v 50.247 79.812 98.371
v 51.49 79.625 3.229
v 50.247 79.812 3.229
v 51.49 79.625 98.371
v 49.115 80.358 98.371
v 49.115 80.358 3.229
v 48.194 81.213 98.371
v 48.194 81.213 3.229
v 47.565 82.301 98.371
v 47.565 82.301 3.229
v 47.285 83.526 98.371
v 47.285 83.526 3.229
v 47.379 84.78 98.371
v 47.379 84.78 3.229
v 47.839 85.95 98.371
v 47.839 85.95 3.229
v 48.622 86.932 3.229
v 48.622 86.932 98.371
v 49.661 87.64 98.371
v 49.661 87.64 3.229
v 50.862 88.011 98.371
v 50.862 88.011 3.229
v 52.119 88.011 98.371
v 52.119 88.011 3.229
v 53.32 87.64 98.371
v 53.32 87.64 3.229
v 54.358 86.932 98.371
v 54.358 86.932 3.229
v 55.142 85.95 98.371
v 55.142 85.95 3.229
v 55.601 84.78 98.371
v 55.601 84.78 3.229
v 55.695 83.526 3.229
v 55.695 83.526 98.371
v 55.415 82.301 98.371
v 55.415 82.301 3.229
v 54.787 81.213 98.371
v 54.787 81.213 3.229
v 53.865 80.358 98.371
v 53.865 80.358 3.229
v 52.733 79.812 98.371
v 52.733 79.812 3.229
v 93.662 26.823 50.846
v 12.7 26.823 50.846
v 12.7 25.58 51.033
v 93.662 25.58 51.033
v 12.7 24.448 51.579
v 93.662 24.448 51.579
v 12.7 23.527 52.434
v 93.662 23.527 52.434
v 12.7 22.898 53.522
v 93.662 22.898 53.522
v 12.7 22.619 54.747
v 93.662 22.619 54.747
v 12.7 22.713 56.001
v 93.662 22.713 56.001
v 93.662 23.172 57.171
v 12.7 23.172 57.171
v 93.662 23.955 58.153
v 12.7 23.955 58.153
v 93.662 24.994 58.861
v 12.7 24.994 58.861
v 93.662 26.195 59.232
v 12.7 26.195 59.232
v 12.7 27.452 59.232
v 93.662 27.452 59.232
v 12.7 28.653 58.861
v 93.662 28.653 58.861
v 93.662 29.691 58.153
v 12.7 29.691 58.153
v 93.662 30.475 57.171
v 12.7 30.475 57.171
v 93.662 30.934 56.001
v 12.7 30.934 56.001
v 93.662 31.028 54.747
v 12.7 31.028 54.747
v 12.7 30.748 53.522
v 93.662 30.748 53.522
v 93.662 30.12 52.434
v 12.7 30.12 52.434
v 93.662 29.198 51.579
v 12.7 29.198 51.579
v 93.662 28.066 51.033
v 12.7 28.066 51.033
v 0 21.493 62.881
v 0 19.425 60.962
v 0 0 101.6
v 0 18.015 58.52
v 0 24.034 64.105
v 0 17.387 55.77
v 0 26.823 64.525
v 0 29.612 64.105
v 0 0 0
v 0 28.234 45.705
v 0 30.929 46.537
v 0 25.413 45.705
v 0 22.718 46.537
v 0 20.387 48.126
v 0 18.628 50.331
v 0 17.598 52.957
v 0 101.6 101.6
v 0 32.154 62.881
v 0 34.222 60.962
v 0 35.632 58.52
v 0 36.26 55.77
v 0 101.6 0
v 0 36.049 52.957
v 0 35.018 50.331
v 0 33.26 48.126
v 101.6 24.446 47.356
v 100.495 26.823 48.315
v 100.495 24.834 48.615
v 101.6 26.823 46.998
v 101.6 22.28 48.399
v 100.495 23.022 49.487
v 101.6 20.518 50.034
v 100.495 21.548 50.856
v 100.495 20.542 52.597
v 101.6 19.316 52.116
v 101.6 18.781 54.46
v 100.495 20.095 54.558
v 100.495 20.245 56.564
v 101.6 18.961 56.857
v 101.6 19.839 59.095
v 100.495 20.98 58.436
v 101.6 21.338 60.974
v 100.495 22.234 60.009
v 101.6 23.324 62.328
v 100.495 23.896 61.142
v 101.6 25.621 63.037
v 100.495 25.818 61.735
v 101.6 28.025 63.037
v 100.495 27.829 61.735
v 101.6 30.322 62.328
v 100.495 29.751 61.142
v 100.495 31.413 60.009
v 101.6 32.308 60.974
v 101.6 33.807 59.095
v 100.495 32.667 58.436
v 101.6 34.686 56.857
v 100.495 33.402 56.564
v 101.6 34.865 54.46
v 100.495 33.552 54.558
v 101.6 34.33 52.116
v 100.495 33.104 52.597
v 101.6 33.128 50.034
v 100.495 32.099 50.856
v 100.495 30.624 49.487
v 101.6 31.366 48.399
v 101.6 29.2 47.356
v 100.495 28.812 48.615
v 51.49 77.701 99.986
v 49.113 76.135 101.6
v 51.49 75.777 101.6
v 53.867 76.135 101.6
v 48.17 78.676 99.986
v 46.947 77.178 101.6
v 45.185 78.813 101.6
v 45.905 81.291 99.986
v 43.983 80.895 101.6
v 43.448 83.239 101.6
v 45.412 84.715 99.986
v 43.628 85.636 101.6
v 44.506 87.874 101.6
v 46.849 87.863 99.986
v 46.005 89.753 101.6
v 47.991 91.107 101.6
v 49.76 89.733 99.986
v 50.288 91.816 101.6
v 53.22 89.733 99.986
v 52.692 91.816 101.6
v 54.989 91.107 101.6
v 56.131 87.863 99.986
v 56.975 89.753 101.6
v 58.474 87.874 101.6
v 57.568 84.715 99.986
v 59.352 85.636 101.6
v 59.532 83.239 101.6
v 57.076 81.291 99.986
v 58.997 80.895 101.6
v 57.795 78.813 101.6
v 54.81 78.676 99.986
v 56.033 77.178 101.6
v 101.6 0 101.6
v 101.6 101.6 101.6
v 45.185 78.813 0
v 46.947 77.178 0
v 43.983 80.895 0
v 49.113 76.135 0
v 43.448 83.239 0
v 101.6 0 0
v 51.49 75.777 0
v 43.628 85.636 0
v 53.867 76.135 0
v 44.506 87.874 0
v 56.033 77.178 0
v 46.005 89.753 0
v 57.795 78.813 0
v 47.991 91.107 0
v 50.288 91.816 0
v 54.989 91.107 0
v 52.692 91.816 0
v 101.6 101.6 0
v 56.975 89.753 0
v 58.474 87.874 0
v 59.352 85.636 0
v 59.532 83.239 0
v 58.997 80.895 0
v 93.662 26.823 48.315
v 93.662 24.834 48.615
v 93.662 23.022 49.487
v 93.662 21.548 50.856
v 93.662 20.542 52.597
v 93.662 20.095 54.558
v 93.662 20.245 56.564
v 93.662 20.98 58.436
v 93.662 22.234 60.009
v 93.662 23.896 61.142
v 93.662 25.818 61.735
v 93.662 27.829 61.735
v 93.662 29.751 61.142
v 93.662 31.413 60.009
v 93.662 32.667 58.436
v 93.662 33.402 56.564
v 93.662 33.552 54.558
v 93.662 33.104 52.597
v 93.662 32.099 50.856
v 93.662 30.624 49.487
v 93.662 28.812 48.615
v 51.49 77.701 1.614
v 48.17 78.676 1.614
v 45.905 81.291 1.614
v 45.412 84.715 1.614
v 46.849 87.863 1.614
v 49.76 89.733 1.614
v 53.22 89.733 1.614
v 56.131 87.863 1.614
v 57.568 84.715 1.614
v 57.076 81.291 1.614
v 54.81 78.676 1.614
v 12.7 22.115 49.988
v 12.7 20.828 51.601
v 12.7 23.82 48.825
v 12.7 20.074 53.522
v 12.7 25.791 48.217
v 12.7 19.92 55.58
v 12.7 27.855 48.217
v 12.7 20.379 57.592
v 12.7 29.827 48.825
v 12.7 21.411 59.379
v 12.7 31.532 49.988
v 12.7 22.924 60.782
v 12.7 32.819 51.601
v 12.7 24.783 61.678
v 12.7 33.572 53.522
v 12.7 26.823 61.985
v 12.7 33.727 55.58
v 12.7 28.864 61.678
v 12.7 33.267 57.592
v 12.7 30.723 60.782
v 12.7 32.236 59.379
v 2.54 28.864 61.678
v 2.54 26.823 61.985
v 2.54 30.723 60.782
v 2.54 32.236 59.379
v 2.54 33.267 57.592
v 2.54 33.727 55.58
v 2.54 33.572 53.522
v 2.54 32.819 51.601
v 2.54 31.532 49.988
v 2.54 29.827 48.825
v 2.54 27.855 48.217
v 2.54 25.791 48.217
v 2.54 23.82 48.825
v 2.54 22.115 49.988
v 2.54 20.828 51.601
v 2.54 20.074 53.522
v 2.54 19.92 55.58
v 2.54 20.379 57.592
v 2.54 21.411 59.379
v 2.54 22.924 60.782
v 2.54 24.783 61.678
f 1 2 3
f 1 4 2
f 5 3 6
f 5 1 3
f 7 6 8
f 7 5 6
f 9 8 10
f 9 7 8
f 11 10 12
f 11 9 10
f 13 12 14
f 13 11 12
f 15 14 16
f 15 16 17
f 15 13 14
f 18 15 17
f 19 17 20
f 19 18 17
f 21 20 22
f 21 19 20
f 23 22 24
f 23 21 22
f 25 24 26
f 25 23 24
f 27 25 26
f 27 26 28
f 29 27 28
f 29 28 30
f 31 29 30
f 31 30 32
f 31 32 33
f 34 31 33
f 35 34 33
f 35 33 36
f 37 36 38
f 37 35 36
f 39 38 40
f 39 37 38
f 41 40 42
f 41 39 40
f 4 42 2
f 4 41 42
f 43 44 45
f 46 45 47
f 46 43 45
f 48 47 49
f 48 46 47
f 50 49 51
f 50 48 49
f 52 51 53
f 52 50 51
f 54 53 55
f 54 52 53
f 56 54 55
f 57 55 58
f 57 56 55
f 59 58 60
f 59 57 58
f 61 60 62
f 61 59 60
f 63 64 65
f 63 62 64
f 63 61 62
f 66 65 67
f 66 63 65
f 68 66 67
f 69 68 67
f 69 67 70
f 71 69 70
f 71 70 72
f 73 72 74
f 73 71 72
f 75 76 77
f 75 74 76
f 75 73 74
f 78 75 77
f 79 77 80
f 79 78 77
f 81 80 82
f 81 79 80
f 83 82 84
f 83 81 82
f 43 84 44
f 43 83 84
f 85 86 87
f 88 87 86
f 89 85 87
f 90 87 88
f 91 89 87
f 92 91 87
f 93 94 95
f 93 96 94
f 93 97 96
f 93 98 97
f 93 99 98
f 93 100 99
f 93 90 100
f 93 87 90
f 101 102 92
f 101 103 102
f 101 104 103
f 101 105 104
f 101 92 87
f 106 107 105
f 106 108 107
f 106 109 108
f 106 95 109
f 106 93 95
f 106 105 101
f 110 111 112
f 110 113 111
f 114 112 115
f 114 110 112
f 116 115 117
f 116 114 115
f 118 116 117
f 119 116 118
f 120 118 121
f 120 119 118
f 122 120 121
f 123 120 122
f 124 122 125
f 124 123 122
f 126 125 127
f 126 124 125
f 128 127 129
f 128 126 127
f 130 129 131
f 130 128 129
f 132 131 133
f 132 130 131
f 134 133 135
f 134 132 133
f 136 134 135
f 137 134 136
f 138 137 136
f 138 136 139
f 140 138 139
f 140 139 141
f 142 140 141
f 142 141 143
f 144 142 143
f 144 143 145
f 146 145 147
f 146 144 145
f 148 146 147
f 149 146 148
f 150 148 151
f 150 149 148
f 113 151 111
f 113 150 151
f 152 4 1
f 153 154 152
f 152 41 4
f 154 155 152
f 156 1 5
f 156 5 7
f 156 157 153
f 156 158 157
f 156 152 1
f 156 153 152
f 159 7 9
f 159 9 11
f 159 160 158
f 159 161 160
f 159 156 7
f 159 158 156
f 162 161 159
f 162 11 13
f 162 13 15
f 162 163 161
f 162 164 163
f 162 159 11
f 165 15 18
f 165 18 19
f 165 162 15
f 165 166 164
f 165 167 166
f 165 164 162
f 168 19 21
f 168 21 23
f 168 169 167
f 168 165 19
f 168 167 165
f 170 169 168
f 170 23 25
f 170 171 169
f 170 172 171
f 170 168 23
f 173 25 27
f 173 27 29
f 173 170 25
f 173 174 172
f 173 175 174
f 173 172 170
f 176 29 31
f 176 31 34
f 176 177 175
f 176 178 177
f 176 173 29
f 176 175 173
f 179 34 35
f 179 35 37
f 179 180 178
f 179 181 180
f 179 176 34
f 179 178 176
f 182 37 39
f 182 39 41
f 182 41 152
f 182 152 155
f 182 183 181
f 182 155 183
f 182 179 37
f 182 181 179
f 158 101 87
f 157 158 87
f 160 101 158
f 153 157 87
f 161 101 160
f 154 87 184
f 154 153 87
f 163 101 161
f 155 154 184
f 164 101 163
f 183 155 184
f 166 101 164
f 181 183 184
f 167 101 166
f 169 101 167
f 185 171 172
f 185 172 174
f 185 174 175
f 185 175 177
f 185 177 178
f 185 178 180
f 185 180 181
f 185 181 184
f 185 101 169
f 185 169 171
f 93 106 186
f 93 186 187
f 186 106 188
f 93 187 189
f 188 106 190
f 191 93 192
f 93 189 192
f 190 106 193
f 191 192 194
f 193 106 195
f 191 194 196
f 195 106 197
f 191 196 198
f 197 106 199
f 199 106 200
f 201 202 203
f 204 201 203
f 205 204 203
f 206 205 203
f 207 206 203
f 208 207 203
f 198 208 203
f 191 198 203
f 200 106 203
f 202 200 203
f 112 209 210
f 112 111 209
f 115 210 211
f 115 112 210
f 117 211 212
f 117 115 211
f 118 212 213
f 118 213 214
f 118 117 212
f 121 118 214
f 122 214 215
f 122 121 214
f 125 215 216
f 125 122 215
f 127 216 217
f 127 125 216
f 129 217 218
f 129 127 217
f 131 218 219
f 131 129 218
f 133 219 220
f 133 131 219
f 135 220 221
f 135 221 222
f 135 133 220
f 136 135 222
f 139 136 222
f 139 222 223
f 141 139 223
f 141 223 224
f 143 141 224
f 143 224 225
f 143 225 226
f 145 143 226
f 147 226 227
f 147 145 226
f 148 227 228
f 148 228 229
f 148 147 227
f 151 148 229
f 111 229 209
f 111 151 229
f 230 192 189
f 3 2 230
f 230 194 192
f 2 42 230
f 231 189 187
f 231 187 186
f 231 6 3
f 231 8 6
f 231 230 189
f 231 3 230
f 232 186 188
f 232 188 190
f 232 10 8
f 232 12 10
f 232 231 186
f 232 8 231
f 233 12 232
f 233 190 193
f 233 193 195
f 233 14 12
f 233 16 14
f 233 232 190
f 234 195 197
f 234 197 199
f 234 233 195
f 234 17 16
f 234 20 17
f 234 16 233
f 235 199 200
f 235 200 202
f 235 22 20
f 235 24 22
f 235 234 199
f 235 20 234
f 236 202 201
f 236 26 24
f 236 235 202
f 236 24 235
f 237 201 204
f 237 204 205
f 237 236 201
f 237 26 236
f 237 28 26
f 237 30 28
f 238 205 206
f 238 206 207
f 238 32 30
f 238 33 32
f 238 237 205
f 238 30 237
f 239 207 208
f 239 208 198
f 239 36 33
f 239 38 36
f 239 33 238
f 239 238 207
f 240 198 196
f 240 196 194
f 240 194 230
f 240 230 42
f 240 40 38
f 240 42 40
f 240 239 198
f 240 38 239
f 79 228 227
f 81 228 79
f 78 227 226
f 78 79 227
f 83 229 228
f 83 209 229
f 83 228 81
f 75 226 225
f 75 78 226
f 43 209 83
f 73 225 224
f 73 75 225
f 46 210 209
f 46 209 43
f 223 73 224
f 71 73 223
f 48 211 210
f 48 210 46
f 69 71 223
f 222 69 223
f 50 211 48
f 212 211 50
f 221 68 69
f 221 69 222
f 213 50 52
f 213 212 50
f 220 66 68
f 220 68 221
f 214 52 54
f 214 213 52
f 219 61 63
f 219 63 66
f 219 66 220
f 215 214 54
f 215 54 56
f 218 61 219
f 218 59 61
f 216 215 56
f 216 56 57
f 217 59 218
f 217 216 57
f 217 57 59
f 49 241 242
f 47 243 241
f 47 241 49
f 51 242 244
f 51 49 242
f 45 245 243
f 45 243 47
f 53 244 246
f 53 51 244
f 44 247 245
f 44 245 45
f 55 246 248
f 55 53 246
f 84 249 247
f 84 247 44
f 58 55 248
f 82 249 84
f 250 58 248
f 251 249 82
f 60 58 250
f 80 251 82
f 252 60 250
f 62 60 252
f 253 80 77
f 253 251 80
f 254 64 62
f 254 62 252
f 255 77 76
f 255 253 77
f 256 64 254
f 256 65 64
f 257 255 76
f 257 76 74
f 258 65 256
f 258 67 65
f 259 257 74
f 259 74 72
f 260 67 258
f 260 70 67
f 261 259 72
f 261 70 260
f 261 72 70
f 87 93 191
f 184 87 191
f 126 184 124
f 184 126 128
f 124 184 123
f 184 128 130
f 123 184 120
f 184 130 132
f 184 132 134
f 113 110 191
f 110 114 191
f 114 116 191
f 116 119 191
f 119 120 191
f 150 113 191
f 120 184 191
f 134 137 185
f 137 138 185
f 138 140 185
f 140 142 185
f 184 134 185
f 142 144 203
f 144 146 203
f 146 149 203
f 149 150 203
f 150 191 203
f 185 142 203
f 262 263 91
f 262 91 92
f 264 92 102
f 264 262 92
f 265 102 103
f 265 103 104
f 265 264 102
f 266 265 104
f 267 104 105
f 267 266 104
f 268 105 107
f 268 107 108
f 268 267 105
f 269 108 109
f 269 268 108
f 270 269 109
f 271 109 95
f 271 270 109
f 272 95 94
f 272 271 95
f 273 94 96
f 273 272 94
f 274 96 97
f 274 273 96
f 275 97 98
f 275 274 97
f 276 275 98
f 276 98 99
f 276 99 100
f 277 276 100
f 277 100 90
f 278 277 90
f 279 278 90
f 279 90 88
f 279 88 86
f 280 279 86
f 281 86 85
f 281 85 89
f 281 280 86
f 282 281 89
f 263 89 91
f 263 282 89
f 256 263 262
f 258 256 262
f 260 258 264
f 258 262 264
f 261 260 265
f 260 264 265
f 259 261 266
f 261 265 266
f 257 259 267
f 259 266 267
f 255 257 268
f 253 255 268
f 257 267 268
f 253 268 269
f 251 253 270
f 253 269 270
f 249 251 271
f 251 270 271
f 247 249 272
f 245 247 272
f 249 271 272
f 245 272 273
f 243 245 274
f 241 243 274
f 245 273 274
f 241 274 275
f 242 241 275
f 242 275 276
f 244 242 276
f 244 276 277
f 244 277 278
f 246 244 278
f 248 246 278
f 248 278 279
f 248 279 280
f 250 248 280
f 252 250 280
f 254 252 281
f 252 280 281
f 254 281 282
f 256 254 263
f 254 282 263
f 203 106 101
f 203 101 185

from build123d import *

# Parameters (mm, degrees)
SKETCH1_W           = 101.6
SKETCH1_H           = 101.6
BOSS_EXTRUDE1_DEPTH = 101.6
SKETCH6_R           = 6.922774564
CUT_EXTRUDE1_DEPTH  = 12.7
CHAMFER2_SIZE       = 2.54


with BuildPart() as part:
    # Sketch1 → Boss-Extrude1 (new body)
    with BuildSketch(Plane.XY):
        with Locations((50.8, 50.8)):
            Rectangle(SKETCH1_W, SKETCH1_H)
    extrude(amount=BOSS_EXTRUDE1_DEPTH)

    # Sketch3 → CSK for 5/16 Flat Head Machine Screw (100)1 (revolve, cut)
    with BuildSketch(Plane(origin=(51.490087233, 83.841482184, 101.6), x_dir=(0, -1, 0), z_dir=(1, 0, 0))):
        Polygon((0, 0), (0, 101.6), (8.0645, 101.6), (4.2164, 98.371060709), (4.2164, 3.228939291), (8.0645, 0), align=None)
    revolve(axis=Axis((51.490087233, 83.841482184, 107.95), (0, 0, -1)), mode=Mode.SUBTRACT)

    # Sketch5 → CBORE for 5/16 Socket Head Cap Screw1 (revolve, cut)
    with BuildSketch(Plane(origin=(101.6, 26.823245181, 55.06253419), x_dir=(0, 0, -1), z_dir=(0, 1, 0))):
        Polygon((0, 0), (0, 101.6), (4.2164, 101.6), (4.2164, 7.9375), (6.74751, 7.9375), (6.74751, 1.105085823), (8.0645, 0), align=None)
    revolve(axis=Axis((107.95, 26.823245181, 55.06253419), (-1, 0, 0)), mode=Mode.SUBTRACT)

    # Sketch6 → Cut-Extrude1 (cut)
    with BuildSketch(Plane.ZY):
        with Locations((55.06253419, 26.823245181)):
            Circle(SKETCH6_R)
    extrude(amount=-CUT_EXTRUDE1_DEPTH, mode=Mode.SUBTRACT)

    # Chamfer2
    chamfer2_edges = [part.edges().sort_by_distance(p)[0] for p in [
        (0, 26.823245181, 48.139759626),
    ]]
    chamfer(chamfer2_edges, length=CHAMFER2_SIZE)


solid = part.part
